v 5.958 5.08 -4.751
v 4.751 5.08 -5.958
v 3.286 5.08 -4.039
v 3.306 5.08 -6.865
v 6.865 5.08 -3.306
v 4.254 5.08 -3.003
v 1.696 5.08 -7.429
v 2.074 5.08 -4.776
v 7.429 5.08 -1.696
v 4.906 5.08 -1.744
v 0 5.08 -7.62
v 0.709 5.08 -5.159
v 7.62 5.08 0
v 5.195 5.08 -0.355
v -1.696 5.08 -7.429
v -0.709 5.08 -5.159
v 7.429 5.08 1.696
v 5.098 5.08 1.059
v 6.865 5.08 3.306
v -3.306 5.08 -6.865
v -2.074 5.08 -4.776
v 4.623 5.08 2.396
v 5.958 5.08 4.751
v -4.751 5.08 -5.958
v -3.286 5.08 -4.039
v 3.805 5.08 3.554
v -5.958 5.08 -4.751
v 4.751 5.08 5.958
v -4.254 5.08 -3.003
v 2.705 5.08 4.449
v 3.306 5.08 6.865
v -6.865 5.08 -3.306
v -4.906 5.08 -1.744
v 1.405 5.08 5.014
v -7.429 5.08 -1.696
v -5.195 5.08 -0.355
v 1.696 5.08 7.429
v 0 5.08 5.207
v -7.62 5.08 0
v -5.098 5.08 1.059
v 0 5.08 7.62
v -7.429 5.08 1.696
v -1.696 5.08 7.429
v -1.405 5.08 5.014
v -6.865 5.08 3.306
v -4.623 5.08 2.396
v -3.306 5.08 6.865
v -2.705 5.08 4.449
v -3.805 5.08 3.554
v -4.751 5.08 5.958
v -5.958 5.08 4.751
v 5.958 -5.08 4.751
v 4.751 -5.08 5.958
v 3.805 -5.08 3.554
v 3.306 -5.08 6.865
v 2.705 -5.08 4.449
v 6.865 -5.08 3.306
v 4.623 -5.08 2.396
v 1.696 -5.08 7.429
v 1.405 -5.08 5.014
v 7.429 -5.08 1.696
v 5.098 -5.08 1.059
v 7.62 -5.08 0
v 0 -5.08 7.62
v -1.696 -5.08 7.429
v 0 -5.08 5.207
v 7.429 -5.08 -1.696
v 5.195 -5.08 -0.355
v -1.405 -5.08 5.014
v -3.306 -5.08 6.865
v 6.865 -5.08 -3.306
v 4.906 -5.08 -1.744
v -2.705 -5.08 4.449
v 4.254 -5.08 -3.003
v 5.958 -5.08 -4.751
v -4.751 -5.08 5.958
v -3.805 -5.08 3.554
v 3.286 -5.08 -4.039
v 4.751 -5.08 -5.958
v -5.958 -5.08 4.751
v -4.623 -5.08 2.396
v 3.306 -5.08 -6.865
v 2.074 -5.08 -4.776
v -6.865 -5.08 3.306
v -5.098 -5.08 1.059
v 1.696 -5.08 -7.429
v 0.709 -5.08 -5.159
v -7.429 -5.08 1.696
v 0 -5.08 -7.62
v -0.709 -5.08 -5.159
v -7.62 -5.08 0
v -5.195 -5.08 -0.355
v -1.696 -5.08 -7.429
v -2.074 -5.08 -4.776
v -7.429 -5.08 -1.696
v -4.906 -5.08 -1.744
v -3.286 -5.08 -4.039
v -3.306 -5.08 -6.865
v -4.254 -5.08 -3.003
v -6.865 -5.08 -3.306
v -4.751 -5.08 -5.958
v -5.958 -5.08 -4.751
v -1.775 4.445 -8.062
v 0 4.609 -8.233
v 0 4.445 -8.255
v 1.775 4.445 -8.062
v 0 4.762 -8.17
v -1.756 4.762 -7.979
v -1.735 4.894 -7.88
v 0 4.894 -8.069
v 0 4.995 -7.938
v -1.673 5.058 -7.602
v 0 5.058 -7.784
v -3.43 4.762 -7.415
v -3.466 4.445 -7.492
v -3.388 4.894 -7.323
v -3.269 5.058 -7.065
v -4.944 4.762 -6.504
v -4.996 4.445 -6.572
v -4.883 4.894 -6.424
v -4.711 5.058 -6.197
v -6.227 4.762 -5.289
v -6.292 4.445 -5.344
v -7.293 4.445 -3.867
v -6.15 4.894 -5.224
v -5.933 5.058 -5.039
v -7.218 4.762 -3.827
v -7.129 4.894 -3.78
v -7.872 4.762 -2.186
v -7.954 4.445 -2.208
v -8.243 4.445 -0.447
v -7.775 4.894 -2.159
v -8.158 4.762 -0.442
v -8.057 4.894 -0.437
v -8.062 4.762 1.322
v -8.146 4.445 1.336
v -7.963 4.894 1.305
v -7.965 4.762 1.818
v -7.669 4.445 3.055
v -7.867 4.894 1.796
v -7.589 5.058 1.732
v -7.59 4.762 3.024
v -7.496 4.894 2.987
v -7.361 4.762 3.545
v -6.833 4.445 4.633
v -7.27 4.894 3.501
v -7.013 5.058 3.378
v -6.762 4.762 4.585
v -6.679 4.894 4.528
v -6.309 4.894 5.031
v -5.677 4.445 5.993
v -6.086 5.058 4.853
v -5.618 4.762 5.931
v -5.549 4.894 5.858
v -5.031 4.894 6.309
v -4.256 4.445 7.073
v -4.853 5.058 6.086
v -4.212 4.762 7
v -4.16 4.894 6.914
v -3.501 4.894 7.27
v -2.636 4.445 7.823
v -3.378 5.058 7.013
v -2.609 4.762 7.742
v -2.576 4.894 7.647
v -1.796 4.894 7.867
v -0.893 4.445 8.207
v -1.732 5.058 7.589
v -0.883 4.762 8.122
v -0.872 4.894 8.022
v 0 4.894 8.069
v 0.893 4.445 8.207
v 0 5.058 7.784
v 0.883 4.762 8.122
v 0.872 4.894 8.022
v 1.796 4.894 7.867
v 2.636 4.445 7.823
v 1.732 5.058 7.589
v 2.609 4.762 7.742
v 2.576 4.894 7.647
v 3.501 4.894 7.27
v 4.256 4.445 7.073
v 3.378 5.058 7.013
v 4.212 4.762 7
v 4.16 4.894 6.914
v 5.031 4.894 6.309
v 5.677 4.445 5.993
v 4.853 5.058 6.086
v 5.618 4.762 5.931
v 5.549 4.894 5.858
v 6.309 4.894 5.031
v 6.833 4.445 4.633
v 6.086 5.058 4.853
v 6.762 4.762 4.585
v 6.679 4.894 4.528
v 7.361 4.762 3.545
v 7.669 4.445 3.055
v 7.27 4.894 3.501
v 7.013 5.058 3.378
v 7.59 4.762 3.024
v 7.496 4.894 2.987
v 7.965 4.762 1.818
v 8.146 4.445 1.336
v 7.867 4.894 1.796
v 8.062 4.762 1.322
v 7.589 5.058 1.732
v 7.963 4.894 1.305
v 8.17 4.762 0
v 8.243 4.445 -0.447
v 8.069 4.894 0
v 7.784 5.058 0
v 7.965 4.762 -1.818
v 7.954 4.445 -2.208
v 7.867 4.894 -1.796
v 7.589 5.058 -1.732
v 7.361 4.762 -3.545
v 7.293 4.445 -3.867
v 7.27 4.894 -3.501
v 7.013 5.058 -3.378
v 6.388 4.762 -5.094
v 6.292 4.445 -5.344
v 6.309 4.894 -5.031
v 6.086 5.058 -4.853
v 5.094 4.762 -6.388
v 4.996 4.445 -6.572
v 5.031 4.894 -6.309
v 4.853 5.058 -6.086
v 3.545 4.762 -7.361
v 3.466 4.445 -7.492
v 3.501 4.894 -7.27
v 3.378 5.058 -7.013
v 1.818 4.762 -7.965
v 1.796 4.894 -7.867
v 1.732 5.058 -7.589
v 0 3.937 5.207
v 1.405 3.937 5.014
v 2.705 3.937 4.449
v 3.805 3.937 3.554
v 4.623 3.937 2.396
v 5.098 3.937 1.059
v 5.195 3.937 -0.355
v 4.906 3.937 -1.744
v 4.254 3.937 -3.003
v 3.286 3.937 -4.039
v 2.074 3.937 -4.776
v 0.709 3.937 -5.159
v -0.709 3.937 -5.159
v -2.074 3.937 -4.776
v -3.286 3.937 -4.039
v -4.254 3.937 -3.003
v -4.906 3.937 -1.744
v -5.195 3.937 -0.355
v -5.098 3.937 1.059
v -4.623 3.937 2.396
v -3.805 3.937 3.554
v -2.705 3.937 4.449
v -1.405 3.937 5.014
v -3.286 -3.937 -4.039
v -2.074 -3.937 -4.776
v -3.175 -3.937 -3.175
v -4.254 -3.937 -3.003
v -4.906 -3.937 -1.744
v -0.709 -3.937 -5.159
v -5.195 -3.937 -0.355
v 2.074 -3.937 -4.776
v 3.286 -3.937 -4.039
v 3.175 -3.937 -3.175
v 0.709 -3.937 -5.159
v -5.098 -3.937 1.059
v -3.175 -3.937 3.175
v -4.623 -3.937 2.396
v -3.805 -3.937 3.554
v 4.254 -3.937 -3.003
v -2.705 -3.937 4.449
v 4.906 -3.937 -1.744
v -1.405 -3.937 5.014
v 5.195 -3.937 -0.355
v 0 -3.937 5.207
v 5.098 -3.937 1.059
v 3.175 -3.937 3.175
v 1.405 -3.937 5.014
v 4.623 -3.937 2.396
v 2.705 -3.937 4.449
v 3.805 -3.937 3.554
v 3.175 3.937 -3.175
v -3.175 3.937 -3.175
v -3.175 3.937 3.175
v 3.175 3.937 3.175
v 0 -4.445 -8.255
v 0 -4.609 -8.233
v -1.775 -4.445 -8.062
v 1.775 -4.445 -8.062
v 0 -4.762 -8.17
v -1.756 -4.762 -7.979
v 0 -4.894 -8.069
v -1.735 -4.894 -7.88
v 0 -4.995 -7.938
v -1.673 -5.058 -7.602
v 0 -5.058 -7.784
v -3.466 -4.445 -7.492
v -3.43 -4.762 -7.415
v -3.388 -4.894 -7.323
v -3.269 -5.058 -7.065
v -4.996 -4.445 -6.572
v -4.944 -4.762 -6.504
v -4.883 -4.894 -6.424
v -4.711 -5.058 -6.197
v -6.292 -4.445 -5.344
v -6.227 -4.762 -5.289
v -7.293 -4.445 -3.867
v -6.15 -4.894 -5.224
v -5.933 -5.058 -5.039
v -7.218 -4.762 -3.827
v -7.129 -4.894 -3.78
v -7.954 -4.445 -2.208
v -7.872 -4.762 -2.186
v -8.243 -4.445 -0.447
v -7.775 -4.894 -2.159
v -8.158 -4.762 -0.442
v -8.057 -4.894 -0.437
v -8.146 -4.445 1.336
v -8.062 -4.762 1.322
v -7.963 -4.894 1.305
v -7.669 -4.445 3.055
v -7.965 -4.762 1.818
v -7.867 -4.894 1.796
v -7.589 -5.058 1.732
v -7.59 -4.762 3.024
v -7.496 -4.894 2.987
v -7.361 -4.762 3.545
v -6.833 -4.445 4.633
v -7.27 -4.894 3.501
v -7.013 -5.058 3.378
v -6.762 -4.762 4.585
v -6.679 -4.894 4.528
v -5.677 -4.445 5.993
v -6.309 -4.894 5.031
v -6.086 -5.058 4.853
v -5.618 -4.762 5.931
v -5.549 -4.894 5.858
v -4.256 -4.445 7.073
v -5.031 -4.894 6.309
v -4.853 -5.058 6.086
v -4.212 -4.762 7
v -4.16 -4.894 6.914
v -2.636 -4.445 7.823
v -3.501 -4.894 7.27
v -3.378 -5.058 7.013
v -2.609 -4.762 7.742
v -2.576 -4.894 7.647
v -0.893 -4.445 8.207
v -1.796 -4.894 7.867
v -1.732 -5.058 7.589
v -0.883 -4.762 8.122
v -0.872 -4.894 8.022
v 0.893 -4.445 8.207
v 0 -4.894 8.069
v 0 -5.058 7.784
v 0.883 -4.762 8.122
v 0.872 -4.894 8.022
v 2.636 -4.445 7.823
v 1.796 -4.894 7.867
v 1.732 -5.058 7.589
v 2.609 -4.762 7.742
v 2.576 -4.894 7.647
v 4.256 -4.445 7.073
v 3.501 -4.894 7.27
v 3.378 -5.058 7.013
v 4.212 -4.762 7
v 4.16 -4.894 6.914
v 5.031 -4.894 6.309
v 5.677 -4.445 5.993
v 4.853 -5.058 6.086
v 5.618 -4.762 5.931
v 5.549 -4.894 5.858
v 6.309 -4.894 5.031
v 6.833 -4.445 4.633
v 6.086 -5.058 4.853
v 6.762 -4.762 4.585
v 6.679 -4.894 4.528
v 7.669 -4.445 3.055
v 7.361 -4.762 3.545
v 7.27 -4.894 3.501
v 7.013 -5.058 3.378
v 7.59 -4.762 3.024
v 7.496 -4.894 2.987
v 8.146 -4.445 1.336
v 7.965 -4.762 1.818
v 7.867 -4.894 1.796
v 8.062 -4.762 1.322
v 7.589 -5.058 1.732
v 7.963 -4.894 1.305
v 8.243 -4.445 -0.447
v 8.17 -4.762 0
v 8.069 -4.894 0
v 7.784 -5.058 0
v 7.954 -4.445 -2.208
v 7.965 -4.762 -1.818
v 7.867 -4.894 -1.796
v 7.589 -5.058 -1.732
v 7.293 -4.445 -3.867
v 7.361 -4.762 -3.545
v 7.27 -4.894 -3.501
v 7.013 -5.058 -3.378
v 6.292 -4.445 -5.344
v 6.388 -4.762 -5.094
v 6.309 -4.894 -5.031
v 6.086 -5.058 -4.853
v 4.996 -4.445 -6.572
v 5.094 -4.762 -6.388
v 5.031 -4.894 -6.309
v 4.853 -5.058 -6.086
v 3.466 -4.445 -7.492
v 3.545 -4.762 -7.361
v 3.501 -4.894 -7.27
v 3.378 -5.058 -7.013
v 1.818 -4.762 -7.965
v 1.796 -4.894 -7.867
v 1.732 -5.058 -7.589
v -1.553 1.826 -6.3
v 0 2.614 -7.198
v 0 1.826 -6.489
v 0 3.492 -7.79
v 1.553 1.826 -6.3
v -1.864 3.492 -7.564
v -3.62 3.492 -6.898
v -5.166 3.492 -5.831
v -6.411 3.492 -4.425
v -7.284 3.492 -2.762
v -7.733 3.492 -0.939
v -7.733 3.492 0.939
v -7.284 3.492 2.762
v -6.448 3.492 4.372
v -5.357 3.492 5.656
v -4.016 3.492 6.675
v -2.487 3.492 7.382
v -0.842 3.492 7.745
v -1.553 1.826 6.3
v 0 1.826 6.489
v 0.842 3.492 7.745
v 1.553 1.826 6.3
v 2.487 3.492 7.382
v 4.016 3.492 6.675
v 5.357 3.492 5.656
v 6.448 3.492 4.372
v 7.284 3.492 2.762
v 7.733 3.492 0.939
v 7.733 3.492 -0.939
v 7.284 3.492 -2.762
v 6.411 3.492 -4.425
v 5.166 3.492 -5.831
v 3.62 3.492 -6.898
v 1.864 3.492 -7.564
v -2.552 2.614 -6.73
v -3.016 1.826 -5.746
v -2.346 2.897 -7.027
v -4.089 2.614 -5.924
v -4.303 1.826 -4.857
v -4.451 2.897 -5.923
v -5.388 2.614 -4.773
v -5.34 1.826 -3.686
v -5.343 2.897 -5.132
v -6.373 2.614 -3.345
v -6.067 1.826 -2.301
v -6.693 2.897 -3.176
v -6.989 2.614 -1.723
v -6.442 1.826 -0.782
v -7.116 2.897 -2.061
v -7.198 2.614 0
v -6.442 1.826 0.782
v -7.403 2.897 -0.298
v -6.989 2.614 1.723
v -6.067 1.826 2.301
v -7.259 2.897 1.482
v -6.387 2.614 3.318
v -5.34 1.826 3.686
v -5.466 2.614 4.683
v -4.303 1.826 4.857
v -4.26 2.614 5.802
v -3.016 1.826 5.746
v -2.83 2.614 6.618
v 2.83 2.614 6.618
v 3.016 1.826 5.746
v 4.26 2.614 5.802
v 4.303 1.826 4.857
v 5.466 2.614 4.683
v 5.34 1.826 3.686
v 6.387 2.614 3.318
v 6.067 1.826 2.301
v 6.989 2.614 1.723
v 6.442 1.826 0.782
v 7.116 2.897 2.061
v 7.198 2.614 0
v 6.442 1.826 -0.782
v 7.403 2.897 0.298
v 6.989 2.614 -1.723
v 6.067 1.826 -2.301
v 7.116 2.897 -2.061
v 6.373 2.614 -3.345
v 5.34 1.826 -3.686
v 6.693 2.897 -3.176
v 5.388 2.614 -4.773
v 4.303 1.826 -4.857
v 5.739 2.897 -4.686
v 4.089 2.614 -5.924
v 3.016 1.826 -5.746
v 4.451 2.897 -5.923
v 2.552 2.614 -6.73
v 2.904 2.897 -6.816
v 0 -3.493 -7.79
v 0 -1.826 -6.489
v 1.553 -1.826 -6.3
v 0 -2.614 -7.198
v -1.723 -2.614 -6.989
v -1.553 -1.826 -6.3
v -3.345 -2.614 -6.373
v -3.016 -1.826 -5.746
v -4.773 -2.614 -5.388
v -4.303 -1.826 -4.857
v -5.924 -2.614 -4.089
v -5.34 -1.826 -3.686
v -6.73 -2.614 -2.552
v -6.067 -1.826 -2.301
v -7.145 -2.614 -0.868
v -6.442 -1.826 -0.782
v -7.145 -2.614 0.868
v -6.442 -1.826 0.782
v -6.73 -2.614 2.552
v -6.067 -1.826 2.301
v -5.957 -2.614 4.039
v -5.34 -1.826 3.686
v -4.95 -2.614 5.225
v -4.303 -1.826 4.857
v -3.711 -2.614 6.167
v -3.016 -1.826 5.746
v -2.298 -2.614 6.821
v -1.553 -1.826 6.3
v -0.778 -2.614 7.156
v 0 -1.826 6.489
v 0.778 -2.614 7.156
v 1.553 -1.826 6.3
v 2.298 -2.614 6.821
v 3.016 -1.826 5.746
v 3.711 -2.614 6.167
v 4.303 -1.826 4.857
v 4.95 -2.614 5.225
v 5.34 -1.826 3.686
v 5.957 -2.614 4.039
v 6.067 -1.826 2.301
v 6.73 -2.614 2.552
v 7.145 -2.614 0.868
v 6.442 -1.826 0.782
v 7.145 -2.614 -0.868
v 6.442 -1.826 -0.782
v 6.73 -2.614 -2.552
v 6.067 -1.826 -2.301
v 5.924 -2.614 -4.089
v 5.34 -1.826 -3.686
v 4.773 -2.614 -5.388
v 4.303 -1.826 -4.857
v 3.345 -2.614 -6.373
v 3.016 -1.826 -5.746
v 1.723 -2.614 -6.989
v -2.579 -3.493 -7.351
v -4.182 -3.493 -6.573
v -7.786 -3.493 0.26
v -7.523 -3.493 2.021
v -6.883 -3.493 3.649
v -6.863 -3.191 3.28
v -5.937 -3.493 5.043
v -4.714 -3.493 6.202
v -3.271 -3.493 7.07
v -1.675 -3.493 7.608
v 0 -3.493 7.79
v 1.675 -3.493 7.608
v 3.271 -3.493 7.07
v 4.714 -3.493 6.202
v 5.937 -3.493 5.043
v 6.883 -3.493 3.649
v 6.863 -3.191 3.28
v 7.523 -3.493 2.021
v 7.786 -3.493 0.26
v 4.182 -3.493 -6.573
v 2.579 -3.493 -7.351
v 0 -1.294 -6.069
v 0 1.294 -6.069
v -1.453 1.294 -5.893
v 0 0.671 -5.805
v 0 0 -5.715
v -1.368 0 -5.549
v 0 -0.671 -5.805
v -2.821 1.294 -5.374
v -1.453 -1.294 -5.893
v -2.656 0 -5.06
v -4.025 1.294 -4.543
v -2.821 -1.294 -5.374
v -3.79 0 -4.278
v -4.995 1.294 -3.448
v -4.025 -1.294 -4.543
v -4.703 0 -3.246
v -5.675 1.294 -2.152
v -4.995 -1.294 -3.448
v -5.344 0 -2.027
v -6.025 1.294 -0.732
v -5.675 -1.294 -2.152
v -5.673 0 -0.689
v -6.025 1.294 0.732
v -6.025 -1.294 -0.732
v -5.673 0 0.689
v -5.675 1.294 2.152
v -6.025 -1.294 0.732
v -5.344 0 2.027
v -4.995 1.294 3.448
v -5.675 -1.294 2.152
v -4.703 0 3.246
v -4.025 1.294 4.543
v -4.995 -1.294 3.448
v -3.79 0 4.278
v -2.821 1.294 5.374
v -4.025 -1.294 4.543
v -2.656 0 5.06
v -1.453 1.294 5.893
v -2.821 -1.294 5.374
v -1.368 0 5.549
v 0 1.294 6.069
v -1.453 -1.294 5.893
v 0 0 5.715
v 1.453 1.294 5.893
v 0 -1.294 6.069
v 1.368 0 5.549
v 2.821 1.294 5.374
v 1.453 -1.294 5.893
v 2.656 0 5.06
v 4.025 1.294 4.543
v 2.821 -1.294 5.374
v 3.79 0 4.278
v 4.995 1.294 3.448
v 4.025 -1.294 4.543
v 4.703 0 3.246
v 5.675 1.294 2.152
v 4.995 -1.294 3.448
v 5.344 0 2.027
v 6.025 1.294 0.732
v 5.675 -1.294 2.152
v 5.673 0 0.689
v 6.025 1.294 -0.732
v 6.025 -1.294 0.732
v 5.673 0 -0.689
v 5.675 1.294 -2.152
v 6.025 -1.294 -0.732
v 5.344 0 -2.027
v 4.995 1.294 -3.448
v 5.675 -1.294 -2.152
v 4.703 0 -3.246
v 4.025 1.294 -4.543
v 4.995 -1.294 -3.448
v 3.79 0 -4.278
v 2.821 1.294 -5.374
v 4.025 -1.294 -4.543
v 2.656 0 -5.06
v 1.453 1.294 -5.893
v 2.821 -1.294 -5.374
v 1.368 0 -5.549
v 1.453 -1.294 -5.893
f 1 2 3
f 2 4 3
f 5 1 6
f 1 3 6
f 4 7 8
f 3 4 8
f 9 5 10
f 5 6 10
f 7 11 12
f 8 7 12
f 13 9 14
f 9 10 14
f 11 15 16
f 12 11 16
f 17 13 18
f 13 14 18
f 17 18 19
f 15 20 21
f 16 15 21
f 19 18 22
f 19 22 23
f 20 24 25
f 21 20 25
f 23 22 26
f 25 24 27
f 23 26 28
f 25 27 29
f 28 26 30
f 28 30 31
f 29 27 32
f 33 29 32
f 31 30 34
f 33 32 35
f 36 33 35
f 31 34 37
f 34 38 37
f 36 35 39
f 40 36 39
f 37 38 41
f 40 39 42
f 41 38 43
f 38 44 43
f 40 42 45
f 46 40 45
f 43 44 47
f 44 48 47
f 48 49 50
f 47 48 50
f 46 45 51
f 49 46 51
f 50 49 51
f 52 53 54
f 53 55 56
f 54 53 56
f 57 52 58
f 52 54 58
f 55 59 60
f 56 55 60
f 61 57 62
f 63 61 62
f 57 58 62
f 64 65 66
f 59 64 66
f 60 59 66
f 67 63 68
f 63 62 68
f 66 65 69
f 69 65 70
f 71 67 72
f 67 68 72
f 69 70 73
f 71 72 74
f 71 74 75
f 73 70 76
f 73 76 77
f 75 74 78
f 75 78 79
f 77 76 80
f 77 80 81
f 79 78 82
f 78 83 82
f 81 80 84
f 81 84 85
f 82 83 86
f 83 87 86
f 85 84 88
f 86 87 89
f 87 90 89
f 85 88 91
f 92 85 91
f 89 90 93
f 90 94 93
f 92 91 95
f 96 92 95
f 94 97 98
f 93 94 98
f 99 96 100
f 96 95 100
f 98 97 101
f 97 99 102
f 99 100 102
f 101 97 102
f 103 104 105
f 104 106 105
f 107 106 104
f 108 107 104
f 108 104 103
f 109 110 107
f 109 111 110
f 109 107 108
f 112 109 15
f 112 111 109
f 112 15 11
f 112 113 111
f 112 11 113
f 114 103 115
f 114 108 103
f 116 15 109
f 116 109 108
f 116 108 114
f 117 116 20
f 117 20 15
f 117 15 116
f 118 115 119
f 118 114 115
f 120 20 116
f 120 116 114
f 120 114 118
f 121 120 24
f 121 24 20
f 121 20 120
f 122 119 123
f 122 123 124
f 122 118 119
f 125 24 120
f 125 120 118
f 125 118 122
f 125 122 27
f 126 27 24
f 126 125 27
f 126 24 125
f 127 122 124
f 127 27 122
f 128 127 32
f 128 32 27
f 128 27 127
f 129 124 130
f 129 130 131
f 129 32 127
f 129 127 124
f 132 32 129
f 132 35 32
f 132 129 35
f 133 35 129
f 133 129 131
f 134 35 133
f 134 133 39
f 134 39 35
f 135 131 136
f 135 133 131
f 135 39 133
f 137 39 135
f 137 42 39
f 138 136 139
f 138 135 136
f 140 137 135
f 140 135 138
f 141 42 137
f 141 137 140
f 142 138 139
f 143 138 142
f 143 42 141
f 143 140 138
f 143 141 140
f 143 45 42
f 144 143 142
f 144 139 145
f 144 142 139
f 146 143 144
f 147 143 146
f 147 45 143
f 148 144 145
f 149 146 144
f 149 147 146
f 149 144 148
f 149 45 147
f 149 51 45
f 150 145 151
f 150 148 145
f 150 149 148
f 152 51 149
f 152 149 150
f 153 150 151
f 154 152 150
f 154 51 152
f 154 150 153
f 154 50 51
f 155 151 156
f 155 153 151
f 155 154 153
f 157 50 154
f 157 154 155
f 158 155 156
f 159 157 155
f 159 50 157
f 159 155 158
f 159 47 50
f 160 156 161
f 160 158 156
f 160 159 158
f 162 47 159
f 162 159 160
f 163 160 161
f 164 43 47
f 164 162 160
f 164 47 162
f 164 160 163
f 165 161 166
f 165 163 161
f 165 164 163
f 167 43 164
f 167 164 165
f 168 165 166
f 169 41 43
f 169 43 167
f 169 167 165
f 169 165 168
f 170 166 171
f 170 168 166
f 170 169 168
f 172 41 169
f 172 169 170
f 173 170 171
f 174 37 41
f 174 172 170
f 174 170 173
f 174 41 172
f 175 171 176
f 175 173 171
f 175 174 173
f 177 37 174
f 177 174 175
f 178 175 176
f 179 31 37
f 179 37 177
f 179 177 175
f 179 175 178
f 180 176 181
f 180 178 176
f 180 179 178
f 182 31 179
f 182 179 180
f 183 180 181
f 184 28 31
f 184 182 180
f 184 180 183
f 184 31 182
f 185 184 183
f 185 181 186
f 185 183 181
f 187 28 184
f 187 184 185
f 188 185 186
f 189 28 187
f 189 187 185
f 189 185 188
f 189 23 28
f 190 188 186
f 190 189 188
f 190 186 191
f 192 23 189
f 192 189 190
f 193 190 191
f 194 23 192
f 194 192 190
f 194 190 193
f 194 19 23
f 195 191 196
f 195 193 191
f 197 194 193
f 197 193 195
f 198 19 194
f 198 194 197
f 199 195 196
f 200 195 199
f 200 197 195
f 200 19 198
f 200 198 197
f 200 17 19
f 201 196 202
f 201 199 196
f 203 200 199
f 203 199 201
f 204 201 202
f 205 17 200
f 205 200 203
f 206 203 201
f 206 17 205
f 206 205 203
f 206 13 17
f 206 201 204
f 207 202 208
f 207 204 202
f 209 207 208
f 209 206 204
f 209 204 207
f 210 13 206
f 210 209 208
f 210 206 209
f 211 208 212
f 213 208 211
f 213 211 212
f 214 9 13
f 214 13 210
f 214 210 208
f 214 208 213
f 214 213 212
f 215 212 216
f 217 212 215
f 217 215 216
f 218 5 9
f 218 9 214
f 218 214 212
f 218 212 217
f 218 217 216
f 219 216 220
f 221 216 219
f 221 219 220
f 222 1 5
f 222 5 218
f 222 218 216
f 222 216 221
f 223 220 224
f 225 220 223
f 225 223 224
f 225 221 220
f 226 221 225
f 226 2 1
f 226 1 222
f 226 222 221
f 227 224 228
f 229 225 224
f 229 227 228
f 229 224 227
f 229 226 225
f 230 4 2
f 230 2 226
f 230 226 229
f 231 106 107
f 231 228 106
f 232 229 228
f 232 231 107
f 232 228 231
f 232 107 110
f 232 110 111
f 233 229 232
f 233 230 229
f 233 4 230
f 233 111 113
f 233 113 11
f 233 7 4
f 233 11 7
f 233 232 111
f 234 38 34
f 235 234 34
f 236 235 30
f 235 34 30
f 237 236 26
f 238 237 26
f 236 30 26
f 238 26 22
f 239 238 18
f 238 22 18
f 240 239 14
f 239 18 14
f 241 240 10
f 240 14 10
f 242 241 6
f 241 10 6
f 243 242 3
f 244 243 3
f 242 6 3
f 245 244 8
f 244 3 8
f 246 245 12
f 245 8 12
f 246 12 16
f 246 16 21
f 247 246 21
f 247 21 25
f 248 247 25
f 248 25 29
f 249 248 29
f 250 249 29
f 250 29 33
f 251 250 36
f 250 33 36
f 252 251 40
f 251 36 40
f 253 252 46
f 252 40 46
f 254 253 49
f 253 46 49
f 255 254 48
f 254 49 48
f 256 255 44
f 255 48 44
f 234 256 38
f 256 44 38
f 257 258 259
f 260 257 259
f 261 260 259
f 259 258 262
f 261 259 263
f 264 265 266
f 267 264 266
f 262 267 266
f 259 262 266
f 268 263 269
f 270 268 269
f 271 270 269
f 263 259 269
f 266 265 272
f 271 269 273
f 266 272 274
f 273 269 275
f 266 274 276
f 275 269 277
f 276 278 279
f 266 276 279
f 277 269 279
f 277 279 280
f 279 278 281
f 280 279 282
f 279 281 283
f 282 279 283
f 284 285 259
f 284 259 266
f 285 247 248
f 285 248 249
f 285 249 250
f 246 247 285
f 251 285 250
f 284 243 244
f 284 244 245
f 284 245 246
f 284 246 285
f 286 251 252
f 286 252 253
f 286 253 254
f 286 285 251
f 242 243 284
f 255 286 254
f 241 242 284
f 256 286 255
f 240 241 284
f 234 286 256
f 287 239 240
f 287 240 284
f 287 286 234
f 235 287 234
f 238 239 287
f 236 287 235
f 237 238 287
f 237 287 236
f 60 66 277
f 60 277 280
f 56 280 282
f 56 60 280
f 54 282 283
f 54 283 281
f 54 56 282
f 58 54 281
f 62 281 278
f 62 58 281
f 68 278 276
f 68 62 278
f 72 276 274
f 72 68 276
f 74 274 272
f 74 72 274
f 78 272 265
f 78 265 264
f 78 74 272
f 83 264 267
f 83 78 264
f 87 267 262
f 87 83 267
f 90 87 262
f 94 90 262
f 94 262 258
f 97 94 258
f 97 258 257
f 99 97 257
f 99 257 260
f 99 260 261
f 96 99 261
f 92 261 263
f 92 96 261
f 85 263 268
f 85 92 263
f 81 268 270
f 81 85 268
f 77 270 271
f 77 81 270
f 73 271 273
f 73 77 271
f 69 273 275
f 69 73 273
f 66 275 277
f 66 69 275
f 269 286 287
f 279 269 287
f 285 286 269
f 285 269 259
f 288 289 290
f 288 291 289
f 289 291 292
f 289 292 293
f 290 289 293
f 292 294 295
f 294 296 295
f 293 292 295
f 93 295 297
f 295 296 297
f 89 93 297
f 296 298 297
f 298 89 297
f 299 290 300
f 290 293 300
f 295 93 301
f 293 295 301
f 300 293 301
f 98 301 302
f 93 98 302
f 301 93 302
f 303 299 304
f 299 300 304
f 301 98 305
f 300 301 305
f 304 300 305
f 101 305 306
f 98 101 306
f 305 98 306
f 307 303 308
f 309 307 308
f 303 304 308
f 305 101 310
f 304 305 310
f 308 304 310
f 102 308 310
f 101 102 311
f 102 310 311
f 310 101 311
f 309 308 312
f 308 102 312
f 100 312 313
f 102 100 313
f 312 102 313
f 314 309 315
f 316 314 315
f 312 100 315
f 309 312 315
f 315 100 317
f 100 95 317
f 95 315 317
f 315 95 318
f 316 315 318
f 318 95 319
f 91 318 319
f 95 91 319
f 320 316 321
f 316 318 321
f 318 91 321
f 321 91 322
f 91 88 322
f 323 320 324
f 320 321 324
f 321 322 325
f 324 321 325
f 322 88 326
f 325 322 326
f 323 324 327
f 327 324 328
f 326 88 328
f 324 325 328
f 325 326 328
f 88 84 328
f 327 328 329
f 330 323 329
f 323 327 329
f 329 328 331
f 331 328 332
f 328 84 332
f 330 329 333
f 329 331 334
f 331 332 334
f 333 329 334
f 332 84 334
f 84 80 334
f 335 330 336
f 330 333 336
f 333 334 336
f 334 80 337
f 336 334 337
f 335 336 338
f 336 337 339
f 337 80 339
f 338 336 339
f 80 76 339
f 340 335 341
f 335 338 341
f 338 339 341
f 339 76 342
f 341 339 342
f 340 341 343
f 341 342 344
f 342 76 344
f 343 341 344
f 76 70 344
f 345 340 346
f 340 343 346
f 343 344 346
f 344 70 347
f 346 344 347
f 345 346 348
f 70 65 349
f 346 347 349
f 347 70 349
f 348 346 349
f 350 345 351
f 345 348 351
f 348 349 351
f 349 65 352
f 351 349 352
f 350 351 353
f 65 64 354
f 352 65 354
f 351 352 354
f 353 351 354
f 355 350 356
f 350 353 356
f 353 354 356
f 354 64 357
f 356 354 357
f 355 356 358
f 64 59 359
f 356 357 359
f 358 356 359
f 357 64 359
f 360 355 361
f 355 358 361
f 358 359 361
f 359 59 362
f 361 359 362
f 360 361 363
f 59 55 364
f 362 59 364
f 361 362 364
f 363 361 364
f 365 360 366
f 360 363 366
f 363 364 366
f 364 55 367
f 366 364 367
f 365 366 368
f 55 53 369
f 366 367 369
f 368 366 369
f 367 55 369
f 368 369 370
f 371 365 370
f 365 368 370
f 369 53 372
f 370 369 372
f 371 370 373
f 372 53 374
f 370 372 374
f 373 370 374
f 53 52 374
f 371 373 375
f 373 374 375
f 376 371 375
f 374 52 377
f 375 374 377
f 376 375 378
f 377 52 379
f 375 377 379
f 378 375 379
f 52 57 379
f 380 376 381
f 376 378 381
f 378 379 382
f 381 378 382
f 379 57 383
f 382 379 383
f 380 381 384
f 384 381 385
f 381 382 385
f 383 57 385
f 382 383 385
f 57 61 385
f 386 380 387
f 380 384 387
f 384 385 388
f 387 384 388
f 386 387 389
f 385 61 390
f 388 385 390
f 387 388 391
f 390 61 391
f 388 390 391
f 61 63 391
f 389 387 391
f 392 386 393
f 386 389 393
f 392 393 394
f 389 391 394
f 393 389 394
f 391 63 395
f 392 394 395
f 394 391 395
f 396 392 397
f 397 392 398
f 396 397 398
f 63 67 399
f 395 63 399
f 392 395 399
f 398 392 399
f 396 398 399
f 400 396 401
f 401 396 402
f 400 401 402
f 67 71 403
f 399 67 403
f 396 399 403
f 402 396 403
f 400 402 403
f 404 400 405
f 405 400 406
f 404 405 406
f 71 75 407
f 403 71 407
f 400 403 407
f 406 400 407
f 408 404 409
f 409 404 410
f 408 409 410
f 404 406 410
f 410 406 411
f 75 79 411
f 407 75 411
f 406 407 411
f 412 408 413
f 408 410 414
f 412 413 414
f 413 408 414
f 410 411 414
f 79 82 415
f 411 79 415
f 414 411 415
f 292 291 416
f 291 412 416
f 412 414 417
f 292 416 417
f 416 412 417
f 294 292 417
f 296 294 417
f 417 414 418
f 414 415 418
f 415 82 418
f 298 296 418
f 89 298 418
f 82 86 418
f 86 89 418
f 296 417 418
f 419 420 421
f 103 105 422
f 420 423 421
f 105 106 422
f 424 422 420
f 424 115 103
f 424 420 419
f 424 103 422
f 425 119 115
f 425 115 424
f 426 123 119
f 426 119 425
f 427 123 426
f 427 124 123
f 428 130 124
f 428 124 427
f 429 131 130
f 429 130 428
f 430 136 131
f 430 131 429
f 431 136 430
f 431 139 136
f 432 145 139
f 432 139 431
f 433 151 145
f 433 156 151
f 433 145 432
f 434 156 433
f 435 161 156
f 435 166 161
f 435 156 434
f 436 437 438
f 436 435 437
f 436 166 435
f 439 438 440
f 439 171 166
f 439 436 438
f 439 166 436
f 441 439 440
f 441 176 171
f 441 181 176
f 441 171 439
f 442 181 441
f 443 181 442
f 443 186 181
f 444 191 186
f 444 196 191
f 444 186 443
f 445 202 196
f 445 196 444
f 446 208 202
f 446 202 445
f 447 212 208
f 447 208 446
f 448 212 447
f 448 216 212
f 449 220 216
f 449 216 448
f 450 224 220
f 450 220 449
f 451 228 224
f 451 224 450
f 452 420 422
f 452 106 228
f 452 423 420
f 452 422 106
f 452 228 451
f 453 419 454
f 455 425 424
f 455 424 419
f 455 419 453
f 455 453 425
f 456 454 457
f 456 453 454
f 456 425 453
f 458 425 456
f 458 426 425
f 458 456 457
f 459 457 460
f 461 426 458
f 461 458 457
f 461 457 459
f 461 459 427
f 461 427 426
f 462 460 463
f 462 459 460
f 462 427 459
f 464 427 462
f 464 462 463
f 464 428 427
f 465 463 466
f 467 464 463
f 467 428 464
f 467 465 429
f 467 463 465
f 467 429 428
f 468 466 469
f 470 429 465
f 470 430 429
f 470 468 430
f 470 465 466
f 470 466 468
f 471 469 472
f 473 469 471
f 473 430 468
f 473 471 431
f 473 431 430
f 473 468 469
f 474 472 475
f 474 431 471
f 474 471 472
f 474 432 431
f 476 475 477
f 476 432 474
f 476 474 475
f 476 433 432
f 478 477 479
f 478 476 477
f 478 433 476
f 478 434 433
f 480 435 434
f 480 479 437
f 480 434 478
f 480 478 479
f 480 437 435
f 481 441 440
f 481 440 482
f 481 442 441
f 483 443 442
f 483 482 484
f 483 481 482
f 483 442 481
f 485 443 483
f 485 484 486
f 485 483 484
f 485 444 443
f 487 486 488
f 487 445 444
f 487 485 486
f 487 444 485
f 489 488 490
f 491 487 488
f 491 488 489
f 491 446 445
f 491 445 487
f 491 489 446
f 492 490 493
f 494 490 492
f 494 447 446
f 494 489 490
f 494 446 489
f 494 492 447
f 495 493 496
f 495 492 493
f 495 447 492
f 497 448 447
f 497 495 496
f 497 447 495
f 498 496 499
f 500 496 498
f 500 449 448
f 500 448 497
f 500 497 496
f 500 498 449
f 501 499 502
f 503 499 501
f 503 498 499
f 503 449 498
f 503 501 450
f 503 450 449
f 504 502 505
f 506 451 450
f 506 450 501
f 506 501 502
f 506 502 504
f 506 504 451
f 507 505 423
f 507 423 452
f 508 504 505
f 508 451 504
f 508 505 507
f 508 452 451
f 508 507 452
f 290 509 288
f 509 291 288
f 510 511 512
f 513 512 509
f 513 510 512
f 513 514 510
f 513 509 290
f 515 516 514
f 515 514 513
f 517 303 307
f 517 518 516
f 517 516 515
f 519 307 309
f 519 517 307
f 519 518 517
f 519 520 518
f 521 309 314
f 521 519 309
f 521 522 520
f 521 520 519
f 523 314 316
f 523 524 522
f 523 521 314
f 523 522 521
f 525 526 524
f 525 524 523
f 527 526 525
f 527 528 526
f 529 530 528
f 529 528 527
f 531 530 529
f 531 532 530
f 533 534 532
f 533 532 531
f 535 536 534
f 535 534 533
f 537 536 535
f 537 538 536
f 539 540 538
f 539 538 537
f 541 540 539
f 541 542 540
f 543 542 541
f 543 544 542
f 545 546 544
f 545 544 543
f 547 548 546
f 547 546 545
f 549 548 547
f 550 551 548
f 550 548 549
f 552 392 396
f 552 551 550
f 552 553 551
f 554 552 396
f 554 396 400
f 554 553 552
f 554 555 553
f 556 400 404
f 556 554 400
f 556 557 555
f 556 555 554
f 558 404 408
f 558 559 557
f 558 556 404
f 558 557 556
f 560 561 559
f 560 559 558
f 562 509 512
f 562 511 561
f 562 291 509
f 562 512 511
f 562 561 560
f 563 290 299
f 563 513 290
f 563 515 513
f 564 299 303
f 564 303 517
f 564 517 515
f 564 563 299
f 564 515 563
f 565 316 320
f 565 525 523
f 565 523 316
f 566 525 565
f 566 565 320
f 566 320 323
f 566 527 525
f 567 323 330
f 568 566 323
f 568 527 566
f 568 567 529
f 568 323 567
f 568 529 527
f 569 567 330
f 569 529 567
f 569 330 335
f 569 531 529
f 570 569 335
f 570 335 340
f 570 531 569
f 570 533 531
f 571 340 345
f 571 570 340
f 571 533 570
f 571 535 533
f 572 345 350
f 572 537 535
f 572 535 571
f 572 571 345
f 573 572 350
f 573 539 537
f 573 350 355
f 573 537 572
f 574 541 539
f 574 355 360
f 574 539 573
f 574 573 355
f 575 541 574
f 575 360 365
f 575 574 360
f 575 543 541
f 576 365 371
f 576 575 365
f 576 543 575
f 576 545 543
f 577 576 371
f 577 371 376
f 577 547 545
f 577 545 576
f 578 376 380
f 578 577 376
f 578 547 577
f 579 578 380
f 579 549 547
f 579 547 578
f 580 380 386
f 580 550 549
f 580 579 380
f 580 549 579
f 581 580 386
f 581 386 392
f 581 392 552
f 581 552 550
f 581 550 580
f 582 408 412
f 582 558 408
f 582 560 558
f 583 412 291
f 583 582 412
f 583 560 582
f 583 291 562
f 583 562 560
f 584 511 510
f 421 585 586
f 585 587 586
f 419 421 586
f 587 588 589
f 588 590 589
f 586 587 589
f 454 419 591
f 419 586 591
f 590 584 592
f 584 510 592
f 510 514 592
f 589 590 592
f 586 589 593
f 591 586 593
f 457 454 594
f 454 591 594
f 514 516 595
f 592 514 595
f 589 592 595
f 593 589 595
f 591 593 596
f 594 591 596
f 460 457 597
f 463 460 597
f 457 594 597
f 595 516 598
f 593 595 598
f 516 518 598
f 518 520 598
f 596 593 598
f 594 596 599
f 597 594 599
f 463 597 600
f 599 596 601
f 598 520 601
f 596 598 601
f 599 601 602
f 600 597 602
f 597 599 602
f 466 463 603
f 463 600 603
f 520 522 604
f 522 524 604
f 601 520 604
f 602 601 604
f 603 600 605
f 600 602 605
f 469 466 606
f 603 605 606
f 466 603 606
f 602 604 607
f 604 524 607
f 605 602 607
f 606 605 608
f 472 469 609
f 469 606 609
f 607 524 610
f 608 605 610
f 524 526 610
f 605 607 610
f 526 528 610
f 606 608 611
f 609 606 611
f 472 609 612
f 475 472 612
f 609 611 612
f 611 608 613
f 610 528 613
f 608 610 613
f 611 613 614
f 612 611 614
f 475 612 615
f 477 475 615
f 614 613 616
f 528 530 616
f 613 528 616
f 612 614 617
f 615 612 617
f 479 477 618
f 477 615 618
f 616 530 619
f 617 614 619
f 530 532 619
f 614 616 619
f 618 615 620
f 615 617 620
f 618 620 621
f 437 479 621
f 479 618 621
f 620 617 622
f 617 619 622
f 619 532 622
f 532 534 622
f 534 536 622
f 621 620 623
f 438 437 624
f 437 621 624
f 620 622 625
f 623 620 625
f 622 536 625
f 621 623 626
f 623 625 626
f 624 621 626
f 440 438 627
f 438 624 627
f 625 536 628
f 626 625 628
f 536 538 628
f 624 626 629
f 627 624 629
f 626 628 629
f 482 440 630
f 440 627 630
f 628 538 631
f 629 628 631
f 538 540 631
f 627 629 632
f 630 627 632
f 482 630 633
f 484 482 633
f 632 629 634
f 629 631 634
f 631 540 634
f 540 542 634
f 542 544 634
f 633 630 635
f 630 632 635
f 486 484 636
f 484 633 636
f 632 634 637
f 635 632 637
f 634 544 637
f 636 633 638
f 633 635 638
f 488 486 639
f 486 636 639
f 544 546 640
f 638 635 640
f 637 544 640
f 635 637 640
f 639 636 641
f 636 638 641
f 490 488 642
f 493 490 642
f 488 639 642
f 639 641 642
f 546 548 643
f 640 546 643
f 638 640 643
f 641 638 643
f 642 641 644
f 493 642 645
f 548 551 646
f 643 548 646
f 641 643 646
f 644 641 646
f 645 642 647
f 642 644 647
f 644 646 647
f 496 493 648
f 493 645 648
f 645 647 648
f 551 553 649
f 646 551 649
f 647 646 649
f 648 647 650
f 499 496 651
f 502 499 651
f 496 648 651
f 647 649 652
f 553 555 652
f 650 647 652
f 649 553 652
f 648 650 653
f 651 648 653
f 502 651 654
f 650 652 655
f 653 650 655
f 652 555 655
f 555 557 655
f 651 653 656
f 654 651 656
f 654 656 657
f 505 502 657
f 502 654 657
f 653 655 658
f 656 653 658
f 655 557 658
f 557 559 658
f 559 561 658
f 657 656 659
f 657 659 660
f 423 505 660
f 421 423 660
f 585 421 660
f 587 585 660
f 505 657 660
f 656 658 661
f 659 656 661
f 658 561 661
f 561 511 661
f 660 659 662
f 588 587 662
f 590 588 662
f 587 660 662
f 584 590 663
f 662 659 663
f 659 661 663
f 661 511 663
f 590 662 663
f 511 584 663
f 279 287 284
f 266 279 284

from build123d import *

# Parameters (mm, degrees)
SKETCH3_W          = 6.35
SKETCH3_H          = 6.35
CUT_EXTRUDE2_DEPTH = 16.476293161
SKETCH4_R          = 5.207
CUT_EXTRUDE3_DEPTH = 1.143
FILLET1_R          = 0.635
FILLET2_R          = 7.62


with BuildPart() as part:
    # Sketch1 → Revolve1 (revolve)
    with BuildSketch(Plane.XY, mode=Mode.PRIVATE) as revolve1_sk:
        with BuildLine():
            Line((8.255, -2.54), (8.255, -5.08))
            Line((8.255, -5.08), (0, -5.08))
            Line((0, -5.08), (0, 5.08))
            Line((0, 5.08), (8.255, 5.08))
            Line((8.255, 5.08), (8.255, 2.54))
            ThreePointArc((8.255, 2.54), (5.715, 0), (8.255, -2.54))
        make_face()
    revolve(revolve1_sk.sketch.rotate(Axis((0, -5.08, 0), (0, 1, 0)), 90), axis=Axis((0, -5.08, 0), (0, 1, 0)))

    # Sketch3 → Cut-Extrude2 (cut, through all)
    with BuildSketch(Plane(origin=(0, 5.08, 0), x_dir=(1, 0, 0), z_dir=(0, 1, 0))):
        Rectangle(SKETCH3_W, SKETCH3_H)
    extrude(amount=-CUT_EXTRUDE2_DEPTH, mode=Mode.SUBTRACT)

    # Sketch4 → Cut-Extrude3 (cut)
    with BuildSketch(Plane(origin=(0, 5.08, 0), x_dir=(1, 0, 0), z_dir=(0, 1, 0))):
        with Locations(Location((0, 0, 0), (0, 0, 270))):
            Circle(SKETCH4_R)
    cut_extrude3 = extrude(amount=-CUT_EXTRUDE3_DEPTH, mode=Mode.SUBTRACT)

    # Mirror1: Cut-Extrude3 across plane
    add(cut_extrude3.mirror(Plane.ZX), mode=Mode.SUBTRACT)

    # Fillet1
    fillet1_edges = [part.edges().sort_by_distance(p)[0] for p in [
        (0, 5.08, 8.255),
        (0, -5.08, 8.255),
    ]]
    fillet(fillet1_edges, radius=FILLET1_R)

    # Fillet2
    # the kernel refuses this fillet: 7.62 mm, written as the material it takes off along each edge
    with BuildSketch(Plane(origin=(0, 2.54, 0), x_dir=(0, 0, -1), z_dir=(1, 0, 0))) as fillet2_piece_1:
        with BuildLine():
            CenterArc((1.191070941, 4.7625), FILLET2_R, 314.048625674, 23.927061489)
            Line((8.255, 1.905), (8.396278581, 1.84785))
            ThreePointArc((8.396278581, 1.84785), (8.4074, 0.9525), (8.4074, 0))
            Line((8.4074, 0), (8.255, -0.1524))
            ThreePointArc((8.255, -0.1524), (7.35965, -0.326635562), (6.594976671, -0.8239125))
            Line((6.594976671, -0.8239125), (6.489017735, -0.714375))
        make_face()
    revolve(axis=Axis((0, 2.54, 0), (0, 1, 0)), mode=Mode.SUBTRACT)
    with BuildSketch(Plane(origin=(0, -2.54, 0), x_dir=(0, 0, -1), z_dir=(1, 0, 0))) as fillet2_piece_2:
        with BuildLine():
            CenterArc((1.191070941, -4.7625), FILLET2_R, 22.024312837, 23.927061489)
            Line((6.489017735, 0.714375), (6.594976671, 0.8239125))
            ThreePointArc((6.594976671, 0.8239125), (7.35965, 0.326635562), (8.255, 0.1524))
            Line((8.255, 0.1524), (8.4074, 0))
            ThreePointArc((8.4074, 0), (8.4074, -0.9525), (8.396278581, -1.84785))
            Line((8.396278581, -1.84785), (8.255, -1.905))
        make_face()
    revolve(axis=Axis((0, -2.54, 0), (0, 1, 0)), mode=Mode.SUBTRACT)


solid = part.part
